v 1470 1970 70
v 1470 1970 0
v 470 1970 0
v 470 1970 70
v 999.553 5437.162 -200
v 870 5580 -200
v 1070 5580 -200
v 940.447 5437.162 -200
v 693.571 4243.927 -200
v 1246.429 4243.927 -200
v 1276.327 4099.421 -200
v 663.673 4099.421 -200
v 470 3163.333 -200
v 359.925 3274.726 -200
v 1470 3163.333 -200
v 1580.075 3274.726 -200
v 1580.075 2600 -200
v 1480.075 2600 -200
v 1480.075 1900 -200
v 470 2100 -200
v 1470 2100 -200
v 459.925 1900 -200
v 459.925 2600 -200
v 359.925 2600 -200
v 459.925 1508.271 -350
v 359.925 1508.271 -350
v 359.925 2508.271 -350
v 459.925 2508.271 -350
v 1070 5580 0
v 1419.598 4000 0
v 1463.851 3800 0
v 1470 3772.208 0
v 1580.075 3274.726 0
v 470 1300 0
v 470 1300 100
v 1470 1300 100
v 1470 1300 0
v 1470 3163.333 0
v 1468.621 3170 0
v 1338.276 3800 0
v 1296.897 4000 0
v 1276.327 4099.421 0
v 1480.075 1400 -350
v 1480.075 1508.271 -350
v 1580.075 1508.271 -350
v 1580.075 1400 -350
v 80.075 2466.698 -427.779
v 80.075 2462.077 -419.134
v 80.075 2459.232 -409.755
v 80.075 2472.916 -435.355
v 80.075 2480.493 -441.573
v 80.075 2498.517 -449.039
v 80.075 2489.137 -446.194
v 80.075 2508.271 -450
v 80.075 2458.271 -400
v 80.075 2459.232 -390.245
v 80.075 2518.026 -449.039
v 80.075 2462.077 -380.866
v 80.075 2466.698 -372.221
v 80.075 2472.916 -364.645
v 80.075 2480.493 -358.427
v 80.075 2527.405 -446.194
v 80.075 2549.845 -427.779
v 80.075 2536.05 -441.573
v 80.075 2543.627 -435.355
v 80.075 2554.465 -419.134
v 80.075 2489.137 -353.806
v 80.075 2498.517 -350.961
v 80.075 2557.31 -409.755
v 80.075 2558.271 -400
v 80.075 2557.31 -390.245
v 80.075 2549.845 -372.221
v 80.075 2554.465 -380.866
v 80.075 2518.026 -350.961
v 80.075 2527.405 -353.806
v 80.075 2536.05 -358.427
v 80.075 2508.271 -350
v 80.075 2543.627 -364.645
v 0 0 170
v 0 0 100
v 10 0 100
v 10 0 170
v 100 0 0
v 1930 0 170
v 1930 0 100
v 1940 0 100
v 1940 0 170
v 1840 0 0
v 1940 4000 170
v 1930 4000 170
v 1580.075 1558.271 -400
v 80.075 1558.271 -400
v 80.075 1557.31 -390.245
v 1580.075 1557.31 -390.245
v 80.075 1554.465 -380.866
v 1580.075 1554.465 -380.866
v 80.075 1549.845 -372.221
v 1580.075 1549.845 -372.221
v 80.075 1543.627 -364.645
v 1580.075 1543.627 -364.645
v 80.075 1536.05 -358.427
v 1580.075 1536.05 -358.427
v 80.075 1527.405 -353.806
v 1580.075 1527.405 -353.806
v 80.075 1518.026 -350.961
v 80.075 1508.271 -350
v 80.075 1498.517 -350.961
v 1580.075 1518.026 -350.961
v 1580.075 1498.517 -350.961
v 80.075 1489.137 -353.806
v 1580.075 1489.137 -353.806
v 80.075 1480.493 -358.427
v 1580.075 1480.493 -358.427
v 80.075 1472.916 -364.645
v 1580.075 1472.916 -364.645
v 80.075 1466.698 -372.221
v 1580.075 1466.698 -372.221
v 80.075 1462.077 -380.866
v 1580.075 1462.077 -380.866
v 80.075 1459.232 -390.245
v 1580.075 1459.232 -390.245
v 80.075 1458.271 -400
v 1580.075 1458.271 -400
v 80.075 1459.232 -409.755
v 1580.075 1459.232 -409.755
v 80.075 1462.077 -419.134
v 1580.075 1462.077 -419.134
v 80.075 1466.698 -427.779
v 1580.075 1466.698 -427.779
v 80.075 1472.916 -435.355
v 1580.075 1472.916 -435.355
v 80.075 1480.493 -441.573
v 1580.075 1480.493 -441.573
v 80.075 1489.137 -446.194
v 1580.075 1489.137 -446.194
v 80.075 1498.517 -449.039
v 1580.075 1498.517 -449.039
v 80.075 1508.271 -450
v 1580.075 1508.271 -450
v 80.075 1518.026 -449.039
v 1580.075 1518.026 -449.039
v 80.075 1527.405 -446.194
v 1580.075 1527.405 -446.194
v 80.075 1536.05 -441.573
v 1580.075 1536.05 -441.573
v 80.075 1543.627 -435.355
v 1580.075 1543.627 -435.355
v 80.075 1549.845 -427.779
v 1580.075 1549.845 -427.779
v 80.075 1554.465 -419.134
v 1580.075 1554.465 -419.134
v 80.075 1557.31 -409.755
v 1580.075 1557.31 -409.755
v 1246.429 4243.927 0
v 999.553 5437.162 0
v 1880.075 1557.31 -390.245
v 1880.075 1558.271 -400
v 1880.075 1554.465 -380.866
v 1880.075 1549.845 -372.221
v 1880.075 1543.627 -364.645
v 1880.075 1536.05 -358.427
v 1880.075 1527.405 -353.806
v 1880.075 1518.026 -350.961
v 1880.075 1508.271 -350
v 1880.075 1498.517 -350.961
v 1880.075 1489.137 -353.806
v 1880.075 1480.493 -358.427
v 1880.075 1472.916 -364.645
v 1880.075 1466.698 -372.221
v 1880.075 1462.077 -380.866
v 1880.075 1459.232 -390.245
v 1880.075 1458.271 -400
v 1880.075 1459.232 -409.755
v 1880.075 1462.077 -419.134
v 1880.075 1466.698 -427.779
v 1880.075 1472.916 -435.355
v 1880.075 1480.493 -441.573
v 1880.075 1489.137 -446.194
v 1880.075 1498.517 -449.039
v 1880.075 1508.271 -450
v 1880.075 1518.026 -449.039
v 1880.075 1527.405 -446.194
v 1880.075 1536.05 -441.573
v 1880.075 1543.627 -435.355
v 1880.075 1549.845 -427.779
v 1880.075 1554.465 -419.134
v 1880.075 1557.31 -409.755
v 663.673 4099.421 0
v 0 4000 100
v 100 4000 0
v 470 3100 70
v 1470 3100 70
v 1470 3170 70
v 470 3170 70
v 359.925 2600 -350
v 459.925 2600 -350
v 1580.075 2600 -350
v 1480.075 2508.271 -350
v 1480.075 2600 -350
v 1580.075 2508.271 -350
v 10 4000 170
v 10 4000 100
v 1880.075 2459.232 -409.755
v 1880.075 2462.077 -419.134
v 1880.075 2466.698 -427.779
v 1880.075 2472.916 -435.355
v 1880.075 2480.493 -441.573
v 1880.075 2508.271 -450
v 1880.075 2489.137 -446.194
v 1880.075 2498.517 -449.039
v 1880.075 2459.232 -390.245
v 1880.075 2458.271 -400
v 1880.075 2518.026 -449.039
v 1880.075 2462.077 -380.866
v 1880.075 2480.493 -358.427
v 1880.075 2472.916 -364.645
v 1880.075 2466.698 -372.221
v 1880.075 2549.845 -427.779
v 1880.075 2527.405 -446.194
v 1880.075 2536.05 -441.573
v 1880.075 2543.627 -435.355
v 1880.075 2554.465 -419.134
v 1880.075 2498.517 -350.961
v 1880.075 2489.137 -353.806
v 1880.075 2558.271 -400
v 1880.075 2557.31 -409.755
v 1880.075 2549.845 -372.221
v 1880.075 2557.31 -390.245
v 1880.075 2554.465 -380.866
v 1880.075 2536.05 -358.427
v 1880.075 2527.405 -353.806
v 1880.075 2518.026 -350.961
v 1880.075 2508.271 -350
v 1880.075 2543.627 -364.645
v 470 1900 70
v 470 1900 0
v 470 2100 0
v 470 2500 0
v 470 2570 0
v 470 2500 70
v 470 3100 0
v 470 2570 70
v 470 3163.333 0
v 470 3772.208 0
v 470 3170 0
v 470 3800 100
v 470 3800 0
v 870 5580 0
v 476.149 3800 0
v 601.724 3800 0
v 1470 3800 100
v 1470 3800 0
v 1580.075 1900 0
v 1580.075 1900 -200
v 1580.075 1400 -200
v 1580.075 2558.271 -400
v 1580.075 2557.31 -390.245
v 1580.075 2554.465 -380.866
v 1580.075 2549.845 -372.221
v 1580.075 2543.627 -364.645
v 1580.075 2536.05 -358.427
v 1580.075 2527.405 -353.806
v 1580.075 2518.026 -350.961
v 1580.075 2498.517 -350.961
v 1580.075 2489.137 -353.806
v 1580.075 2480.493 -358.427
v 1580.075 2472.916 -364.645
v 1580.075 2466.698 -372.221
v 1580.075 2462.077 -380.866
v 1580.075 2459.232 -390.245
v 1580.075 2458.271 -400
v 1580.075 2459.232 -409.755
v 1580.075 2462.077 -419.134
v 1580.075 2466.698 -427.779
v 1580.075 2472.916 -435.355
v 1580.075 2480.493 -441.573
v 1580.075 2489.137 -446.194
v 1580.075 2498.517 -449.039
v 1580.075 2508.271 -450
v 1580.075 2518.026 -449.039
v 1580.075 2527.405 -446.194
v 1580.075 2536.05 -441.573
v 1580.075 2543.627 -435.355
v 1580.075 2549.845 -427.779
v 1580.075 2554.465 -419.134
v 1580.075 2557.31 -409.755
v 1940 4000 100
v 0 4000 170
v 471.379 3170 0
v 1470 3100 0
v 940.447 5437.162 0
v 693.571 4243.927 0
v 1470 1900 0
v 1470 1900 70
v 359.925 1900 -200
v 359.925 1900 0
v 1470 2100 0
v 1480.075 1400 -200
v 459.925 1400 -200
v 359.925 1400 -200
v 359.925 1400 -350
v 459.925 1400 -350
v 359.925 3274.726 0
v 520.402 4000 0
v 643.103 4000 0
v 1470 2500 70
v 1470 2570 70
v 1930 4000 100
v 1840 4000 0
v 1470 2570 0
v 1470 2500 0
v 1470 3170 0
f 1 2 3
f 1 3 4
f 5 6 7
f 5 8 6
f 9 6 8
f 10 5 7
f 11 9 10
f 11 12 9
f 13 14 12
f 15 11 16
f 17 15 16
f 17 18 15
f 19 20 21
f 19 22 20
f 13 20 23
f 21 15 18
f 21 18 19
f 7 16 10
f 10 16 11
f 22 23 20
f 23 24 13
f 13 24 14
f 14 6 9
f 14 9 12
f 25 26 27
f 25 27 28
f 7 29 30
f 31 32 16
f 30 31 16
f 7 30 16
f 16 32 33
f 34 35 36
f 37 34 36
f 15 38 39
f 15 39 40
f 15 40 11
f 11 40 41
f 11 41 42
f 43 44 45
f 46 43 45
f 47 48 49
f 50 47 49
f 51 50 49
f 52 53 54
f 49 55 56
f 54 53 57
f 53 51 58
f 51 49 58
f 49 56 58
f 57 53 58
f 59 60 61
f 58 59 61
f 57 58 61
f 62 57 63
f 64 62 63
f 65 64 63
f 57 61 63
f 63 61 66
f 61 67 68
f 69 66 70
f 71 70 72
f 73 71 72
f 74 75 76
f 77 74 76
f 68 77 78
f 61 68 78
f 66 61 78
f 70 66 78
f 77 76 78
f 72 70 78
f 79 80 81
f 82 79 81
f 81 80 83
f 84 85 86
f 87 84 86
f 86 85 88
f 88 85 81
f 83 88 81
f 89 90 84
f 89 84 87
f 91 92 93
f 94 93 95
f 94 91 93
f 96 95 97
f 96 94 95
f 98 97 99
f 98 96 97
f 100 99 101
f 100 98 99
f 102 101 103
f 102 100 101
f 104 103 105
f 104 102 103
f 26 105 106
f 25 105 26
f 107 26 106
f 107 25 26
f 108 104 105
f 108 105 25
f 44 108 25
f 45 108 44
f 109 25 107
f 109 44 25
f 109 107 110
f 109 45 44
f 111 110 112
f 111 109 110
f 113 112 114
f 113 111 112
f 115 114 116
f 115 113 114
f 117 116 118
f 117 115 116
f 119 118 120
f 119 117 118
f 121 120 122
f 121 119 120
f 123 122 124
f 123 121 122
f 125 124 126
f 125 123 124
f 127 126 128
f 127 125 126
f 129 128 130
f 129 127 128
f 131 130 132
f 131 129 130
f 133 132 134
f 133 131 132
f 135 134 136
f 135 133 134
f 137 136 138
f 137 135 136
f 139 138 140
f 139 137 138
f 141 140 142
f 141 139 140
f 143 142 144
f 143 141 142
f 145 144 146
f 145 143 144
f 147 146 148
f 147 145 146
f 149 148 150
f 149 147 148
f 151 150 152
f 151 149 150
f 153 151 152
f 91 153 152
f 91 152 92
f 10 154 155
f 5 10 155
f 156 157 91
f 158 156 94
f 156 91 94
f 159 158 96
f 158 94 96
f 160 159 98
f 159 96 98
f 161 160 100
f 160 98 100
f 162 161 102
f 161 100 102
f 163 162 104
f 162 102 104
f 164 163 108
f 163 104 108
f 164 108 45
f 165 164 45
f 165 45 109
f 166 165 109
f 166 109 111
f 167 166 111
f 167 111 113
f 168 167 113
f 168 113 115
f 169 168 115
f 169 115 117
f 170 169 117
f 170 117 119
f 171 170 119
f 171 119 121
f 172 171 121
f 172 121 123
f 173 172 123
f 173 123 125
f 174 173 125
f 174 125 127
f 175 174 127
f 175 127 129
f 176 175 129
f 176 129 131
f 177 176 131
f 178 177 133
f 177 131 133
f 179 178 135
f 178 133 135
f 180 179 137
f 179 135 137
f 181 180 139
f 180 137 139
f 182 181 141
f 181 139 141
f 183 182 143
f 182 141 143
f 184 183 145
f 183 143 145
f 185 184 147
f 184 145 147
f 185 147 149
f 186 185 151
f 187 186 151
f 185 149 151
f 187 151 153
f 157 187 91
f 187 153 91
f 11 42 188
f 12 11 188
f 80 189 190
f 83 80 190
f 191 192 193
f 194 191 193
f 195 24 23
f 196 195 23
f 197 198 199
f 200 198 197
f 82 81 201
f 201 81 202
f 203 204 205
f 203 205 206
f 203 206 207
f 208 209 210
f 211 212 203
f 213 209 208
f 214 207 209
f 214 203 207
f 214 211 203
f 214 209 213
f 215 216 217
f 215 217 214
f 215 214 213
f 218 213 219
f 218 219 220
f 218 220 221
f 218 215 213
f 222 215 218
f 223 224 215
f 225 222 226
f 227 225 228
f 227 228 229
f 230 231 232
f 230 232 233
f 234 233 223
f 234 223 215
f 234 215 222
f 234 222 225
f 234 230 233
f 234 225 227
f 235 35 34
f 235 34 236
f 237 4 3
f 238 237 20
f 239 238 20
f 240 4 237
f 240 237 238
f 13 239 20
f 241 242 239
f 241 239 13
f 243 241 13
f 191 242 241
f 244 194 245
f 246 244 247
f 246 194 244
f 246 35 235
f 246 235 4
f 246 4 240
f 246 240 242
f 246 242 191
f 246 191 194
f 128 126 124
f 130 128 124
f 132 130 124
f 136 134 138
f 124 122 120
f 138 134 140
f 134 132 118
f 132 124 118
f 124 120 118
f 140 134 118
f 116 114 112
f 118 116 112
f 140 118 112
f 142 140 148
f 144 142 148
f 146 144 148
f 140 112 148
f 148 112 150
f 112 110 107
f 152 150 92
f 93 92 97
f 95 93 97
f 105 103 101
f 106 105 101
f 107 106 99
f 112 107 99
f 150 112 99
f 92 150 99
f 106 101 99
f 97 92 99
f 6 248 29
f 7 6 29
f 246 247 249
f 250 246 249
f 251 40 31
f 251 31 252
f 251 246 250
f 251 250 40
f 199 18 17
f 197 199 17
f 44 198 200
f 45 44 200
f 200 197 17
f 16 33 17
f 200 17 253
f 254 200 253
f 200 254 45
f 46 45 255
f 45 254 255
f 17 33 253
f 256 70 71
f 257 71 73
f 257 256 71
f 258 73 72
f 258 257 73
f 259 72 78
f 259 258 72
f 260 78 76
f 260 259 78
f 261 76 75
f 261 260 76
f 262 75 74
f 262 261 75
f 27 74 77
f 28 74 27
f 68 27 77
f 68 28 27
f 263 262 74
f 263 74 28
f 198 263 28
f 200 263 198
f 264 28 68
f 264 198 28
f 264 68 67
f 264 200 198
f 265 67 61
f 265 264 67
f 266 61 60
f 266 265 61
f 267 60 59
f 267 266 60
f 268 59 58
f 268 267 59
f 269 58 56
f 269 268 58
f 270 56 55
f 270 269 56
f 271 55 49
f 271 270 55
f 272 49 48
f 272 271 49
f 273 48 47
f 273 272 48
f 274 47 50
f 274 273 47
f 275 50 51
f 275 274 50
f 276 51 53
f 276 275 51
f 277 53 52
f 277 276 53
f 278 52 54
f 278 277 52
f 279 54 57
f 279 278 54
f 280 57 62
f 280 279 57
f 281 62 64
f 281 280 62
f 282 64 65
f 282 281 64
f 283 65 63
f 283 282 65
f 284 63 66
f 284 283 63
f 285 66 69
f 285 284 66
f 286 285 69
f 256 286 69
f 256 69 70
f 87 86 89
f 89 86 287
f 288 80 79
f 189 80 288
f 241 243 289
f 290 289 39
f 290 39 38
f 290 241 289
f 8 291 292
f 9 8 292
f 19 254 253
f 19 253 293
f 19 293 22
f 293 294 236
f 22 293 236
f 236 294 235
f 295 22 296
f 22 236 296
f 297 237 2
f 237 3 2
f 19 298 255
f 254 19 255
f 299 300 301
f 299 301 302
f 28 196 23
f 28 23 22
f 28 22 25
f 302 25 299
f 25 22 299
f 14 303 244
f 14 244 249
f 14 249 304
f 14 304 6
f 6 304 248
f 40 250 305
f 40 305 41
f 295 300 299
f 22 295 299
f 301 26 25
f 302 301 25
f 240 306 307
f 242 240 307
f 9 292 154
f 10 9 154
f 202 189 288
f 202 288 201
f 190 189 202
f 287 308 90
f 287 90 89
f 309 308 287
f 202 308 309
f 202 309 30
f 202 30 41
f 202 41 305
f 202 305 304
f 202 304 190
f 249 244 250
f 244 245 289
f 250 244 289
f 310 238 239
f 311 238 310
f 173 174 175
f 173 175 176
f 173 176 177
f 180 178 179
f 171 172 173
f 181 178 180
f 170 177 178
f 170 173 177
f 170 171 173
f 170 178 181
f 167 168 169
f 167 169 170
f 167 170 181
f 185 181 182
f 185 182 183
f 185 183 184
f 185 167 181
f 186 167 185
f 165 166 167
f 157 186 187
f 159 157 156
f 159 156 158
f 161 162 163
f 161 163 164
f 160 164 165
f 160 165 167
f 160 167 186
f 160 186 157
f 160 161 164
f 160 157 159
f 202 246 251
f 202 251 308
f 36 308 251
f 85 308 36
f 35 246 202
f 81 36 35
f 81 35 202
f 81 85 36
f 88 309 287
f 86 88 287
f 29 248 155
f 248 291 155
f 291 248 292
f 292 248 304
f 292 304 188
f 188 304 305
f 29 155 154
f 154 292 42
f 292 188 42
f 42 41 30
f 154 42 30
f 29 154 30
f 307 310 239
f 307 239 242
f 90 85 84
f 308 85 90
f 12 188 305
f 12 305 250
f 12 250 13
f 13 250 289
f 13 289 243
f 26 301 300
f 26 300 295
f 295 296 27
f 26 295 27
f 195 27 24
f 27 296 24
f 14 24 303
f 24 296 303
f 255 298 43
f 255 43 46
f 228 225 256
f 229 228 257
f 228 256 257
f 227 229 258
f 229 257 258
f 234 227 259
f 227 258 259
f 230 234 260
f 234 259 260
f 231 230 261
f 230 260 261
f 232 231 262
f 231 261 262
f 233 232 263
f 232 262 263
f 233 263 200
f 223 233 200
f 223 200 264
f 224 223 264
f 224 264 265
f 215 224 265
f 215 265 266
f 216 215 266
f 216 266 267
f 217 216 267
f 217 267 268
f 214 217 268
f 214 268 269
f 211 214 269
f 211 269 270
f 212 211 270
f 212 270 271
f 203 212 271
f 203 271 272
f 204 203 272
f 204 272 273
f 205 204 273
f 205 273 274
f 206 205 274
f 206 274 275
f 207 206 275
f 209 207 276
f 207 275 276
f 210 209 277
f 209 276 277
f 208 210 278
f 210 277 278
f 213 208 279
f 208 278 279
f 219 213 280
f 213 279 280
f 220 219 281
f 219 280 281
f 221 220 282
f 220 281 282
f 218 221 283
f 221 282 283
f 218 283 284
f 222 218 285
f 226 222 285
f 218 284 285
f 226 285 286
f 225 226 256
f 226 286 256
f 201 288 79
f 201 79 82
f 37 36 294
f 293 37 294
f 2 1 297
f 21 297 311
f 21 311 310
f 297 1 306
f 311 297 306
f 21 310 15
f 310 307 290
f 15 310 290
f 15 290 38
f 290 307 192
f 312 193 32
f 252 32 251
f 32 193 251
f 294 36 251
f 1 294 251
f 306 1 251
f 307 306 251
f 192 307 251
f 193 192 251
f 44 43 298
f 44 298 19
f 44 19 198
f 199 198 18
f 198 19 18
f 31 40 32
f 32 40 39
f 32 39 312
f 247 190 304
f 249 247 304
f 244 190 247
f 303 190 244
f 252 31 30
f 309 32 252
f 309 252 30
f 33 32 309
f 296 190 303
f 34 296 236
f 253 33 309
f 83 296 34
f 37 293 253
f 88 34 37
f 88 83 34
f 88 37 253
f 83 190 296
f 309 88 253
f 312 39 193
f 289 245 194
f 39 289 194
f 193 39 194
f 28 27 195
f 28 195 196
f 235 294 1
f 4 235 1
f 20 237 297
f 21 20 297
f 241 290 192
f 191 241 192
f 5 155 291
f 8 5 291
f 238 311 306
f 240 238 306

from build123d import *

# Parameters (mm, degrees)
F1_DEPTH       = 4000
F2_W           = 1000
F2_H           = 2500
F3_DEPTH       = 100
F4_W           = 70
F4_H           = 70
F5_DEPTH       = 1000
F6_W           = 10
F6_H           = 4000
F7_DEPTH       = 70
F9_DEPTH       = 200
F10_W          = 100
F10_H          = 500
F10_H_2        = 700
F11_DEPTH      = 150
F12_R          = 50
F13_DEPTH      = 300
F13_DEPTH_BACK = 1500


with BuildPart() as f1:
    # F0 (on Front) → F1 (new body)
    with BuildSketch(Plane.XZ):
        Polygon((0, 100), (100, 0), (1840, 0), (1940, 100), align=None)
    extrude(amount=-F1_DEPTH)

    # F2 (on face) → F3 (cut)
    with BuildSketch(Plane.XY.offset(100)):
        with Locations((970, 2550)):
            Rectangle(F2_W, F2_H)
    extrude(amount=-F3_DEPTH, mode=Mode.SUBTRACT)

    # F4 (on face) → F5 (join)
    with BuildSketch(Plane.YZ.offset(470)):
        with Locations((1935, 35)):
            Rectangle(F4_W, F4_H)
        with Locations((2535, 35)):
            Rectangle(F4_W, F4_H)
        with Locations((3135, 35)):
            Rectangle(F4_W, F4_H)
    extrude(amount=F5_DEPTH)

    # F6 (on face) → F7 (join)
    with BuildSketch(Plane.XY.offset(100)):
        with Locations((5, 2000)):
            Rectangle(F6_W, F6_H)
        with Locations((1935, 2000)):
            Rectangle(F6_W, F6_H)
    extrude(amount=F7_DEPTH)

    # F8 (on face) → F9 (join)
    with BuildSketch(Plane(origin=(0, 0, 0), x_dir=(1, 0, 0), z_dir=(0, 0, -1))):
        Polygon((1580.075055, -3274.725724), (1580.075055, -1900), (359.924945, -1900), (359.924945, -3274.725724), (870, -5580), (1070, -5580), align=None)
        Polygon((999.55261, -5437.162386), (940.44739, -5437.162386), (693.571005, -4243.926525), (1246.428995, -4243.926525), align=None, mode=Mode.SUBTRACT)
        Polygon((470, -2100), (1470, -2100), (1470, -3163.333333), (1276.326635, -4099.421266), (663.673365, -4099.421266), (470, -3163.333333), align=None, mode=Mode.SUBTRACT)
    extrude(amount=F9_DEPTH)

    # F10 (on face) → F11 (join)
    with BuildSketch(Plane(origin=(0, 0, -200), x_dir=(1, 0, 0), z_dir=(0, 0, -1))):
        with Locations((1530.075055, -1650)):
            Rectangle(F10_W, F10_H)
        with Locations((1530.075055, -2250)):
            Rectangle(F10_W, F10_H_2)
        with Locations((409.924945, -1650)):
            Rectangle(F10_W, F10_H)
        with Locations((409.924945, -2250)):
            Rectangle(F10_W, F10_H_2)
    extrude(amount=F11_DEPTH)

    # F12 (on face) → F13 (join, two sides)
    with BuildSketch(Plane.YZ.offset(1580.075055)) as f13_sk:
        with Locations((1508.271217, -400)):
            Circle(F12_R)
        with Locations((2508.271217, -400)):
            Circle(F12_R)
    extrude(amount=F13_DEPTH)
    extrude(f13_sk.sketch, amount=-F13_DEPTH_BACK)


solid = f1.part
